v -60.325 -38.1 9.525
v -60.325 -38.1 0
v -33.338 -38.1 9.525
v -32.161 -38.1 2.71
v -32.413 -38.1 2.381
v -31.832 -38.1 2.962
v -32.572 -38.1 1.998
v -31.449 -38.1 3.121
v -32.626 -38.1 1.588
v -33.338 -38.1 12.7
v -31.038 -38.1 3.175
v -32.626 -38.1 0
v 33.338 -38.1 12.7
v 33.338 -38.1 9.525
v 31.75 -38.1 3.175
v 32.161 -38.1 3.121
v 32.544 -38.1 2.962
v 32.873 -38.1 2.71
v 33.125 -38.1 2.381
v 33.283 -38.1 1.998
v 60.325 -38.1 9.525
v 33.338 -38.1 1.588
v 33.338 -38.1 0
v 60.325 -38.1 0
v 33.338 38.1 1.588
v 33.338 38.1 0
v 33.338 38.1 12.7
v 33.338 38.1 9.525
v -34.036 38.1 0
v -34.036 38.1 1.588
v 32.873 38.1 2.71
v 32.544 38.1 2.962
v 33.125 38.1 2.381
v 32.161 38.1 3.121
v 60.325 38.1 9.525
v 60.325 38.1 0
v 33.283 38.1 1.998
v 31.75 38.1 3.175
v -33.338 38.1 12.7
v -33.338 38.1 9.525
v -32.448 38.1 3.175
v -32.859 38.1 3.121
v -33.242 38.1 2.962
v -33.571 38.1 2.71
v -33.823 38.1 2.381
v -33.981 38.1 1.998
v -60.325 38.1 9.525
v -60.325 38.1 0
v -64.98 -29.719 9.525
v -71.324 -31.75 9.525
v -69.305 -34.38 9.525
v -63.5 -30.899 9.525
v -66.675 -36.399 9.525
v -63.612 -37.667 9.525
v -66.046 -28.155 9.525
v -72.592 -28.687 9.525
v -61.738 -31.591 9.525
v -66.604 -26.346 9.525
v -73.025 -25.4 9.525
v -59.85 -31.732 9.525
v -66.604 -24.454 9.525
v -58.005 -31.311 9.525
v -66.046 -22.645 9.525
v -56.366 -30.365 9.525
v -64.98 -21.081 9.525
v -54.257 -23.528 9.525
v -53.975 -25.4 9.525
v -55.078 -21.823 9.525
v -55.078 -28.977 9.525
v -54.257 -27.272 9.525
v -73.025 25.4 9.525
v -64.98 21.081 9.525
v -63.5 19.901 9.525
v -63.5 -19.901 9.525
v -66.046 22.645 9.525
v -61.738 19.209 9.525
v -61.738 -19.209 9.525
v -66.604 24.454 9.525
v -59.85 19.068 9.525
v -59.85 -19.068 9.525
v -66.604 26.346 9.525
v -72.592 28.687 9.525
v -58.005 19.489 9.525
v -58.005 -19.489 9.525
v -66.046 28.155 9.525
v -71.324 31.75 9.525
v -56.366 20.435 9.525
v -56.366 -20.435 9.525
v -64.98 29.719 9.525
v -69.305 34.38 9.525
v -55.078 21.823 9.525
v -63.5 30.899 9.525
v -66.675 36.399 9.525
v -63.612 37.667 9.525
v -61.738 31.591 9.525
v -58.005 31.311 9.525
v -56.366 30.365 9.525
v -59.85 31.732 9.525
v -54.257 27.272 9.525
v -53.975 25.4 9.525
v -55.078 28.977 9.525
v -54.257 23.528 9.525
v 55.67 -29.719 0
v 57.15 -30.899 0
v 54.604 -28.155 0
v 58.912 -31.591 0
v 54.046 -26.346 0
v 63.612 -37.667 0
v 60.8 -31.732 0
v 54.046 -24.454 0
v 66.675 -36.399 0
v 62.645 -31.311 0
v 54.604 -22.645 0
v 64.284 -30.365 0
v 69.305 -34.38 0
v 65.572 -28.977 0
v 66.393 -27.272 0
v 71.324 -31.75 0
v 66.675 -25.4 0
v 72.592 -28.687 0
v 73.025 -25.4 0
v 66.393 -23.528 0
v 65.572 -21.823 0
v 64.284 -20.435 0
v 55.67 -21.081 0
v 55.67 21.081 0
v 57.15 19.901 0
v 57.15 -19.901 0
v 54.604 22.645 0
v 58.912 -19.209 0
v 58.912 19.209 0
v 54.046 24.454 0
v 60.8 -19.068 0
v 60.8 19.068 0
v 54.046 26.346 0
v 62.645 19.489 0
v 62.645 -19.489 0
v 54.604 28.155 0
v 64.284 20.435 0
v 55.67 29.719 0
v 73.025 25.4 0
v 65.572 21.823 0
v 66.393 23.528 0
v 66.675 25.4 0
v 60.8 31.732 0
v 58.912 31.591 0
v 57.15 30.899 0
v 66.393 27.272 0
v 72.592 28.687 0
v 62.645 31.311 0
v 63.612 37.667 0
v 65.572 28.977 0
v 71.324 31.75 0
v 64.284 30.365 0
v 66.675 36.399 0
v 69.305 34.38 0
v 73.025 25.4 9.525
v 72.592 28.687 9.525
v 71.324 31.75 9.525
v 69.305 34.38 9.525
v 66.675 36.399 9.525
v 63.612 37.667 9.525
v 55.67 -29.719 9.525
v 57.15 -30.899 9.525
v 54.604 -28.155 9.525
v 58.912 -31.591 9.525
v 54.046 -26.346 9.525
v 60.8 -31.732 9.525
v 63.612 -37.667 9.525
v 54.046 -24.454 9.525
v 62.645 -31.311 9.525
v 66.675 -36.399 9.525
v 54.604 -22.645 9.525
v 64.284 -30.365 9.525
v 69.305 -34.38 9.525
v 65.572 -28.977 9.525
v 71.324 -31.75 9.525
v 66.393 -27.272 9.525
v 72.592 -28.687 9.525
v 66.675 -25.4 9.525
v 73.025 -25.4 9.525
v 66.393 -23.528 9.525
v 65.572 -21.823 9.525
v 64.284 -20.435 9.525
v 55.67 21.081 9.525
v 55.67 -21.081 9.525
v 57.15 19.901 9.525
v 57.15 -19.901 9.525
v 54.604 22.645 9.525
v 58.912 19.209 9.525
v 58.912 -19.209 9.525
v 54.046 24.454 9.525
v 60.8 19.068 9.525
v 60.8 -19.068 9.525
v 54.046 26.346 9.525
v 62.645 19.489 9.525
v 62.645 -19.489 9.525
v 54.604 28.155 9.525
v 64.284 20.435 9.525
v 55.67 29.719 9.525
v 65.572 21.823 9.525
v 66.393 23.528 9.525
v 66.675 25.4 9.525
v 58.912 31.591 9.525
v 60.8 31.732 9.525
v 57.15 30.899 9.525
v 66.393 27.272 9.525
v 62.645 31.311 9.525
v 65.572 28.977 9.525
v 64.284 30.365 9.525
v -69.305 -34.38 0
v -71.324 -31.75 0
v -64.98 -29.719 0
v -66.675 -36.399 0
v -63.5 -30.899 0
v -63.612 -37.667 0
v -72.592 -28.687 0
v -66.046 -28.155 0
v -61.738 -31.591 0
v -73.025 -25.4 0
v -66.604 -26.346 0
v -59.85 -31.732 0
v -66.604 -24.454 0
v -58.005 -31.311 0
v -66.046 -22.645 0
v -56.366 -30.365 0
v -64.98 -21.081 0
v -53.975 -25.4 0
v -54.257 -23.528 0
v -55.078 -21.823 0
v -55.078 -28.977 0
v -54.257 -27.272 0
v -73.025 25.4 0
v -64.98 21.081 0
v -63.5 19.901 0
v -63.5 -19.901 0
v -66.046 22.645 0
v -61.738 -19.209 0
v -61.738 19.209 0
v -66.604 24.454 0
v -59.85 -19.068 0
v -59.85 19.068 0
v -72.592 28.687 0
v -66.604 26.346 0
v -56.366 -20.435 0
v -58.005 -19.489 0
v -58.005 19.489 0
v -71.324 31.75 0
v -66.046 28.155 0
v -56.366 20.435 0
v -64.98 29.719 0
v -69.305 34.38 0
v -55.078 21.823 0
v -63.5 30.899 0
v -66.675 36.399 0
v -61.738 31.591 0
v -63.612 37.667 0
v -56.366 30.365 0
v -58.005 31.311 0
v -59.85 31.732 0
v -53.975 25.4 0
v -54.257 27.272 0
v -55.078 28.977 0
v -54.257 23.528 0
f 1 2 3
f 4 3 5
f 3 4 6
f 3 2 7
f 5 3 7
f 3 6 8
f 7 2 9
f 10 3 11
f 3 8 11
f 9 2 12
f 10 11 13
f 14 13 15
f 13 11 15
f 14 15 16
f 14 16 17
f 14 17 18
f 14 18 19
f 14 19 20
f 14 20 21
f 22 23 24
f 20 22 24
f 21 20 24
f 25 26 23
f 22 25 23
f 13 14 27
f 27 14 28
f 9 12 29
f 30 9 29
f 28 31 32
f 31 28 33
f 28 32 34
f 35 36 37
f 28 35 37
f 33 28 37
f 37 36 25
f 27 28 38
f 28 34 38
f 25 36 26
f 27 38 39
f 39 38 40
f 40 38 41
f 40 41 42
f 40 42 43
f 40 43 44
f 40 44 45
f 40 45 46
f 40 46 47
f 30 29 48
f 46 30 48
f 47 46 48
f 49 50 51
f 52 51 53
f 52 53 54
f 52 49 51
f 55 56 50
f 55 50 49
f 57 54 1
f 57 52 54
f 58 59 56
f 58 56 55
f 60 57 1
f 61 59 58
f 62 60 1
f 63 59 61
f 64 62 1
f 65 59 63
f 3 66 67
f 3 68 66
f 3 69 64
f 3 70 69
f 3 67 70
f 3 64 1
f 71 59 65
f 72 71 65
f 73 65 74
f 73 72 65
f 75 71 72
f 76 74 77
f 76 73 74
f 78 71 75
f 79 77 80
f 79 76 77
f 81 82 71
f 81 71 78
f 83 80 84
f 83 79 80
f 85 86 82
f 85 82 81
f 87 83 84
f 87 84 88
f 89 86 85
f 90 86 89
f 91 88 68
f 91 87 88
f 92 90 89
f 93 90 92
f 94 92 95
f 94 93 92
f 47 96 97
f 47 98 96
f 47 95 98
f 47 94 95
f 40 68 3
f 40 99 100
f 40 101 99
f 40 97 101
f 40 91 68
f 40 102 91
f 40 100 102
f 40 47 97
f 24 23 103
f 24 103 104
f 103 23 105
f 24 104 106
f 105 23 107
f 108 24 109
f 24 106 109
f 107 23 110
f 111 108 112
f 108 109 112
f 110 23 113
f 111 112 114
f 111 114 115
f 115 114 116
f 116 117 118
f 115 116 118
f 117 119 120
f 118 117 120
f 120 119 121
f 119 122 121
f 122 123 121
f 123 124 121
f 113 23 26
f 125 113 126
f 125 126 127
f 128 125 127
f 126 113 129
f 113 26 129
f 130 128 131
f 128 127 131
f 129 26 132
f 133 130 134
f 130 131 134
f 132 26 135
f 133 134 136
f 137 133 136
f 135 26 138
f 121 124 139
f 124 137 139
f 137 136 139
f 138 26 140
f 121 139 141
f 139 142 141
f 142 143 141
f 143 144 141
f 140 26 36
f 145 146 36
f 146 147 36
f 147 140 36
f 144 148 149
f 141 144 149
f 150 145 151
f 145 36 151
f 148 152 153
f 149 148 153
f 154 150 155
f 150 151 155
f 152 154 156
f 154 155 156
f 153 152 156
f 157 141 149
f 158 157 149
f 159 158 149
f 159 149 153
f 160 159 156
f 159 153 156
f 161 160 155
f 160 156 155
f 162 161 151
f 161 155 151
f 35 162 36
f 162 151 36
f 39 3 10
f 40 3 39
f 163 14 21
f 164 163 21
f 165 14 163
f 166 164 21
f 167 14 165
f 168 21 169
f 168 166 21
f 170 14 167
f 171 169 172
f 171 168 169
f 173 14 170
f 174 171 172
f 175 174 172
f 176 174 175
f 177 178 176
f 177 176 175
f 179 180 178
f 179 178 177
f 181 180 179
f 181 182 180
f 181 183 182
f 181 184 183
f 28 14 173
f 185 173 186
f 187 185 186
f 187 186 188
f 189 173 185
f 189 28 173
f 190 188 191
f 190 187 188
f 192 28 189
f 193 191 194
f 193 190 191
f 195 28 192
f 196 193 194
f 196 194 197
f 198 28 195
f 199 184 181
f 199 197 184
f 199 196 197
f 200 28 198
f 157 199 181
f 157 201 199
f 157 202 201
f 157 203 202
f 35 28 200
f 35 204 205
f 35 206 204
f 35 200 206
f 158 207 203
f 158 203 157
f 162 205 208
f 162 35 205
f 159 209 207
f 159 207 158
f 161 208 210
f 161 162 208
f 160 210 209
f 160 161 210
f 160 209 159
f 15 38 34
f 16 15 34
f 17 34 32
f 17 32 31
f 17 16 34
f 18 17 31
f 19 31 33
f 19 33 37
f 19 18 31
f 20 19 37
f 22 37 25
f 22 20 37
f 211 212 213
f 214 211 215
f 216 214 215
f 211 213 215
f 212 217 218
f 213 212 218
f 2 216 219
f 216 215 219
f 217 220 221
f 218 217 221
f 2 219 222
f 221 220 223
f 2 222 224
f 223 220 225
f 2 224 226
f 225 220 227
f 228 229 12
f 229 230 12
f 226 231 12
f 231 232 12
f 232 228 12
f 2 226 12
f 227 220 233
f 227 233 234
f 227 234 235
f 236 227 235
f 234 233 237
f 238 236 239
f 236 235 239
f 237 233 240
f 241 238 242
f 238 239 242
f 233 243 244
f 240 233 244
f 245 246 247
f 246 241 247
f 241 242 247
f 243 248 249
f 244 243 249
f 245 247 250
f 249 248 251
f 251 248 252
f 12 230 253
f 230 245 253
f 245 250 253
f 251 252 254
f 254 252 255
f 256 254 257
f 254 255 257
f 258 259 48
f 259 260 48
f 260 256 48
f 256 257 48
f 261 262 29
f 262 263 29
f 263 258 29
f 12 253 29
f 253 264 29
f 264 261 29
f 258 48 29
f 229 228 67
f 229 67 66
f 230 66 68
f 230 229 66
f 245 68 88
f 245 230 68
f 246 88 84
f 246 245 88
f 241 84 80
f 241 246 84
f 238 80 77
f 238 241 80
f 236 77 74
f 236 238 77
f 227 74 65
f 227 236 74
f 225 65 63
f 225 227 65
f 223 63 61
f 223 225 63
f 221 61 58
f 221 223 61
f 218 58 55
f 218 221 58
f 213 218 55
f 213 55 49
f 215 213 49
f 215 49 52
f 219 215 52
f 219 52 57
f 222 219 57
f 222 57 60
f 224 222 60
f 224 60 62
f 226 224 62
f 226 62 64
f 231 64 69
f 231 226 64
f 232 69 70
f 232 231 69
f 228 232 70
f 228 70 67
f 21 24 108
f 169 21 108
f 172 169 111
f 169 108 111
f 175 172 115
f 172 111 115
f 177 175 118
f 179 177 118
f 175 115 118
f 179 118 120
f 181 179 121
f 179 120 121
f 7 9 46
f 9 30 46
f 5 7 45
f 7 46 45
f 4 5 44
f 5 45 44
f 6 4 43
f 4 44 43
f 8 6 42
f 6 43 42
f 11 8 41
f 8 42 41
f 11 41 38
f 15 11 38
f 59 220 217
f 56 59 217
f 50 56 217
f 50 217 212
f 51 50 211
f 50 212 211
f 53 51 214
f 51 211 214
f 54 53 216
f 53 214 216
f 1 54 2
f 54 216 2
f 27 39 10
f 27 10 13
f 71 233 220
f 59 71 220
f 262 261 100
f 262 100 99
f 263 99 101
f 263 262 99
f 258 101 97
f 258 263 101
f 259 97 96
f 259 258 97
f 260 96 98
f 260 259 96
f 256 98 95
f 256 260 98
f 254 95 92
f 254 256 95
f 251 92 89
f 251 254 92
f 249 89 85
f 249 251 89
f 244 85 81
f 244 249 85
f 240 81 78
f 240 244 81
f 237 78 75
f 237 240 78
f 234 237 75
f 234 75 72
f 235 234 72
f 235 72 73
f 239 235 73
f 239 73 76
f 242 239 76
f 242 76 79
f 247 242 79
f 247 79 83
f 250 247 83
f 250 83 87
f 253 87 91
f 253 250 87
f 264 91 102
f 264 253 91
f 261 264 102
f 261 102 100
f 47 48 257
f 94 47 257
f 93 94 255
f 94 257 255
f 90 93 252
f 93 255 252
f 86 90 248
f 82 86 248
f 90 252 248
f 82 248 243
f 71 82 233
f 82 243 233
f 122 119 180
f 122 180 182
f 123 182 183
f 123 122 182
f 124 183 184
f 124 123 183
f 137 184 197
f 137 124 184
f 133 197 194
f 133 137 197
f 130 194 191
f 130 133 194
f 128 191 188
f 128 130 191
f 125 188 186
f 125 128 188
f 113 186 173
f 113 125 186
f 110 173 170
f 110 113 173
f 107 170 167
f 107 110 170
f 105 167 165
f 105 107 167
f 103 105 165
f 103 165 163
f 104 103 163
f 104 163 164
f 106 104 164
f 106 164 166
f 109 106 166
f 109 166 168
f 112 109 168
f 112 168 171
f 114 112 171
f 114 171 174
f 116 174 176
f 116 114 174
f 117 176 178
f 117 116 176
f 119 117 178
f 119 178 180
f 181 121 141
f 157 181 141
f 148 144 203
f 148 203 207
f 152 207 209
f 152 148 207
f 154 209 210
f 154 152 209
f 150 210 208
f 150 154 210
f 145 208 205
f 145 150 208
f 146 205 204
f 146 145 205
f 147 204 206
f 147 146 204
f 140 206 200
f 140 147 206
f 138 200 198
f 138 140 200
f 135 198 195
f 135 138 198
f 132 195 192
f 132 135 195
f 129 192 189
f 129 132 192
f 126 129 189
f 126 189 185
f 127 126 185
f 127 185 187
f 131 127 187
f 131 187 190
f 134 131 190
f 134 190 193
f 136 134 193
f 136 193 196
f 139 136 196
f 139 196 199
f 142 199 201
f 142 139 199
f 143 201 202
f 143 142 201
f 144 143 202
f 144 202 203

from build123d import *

# Parameters (mm, degrees)
F0_W     = 66.675
F0_H     = 76.2
F0_R     = 6.35
F1_DEPTH = 9.525
F2_W     = 66.675
F2_H     = 76.2
F3_DEPTH = 3.175
F5_DEPTH = 3.175
F6_R     = 1.5875


with BuildPart() as f1:
    # F0 (on Top) → F1 (new body)
    with BuildSketch(Plane.XY):
        Rectangle(F0_W, F0_H)
        with BuildLine():
            Line((60.325, 38.1), (33.3375, 38.1))
            Line((33.3375, 38.1), (33.3375, -38.1))
            Line((33.3375, -38.1), (60.325, -38.1))
            ThreePointArc((60.325, -38.1), (69.305256, -34.380256), (73.025, -25.4))
            Line((73.025, -25.4), (73.025, 25.4))
            ThreePointArc((73.025, 25.4), (69.305256, 34.380256), (60.325, 38.1))
        make_face()
        with Locations((60.325, -25.4)):
            Circle(F0_R, mode=Mode.SUBTRACT)
        with Locations((60.325, 25.4)):
            Circle(F0_R, mode=Mode.SUBTRACT)
        with BuildLine():
            Line((-33.3375, 38.1), (-60.325, 38.1))
            ThreePointArc((-60.325, 38.1), (-69.305256, 34.380256), (-73.025, 25.4))
            Line((-73.025, 25.4), (-73.025, -25.4))
            ThreePointArc((-73.025, -25.4), (-69.305256, -34.380256), (-60.325, -38.1))
            Line((-60.325, -38.1), (-33.3375, -38.1))
            Line((-33.3375, -38.1), (-33.3375, 38.1))
        make_face()
        with Locations((-60.325, -25.4)):
            Circle(F0_R, mode=Mode.SUBTRACT)
        with Locations((-60.325, 25.4)):
            Circle(F0_R, mode=Mode.SUBTRACT)
    extrude(amount=F1_DEPTH)

    # F2 (on face) → F3 (join)
    with BuildSketch(Plane.XY.offset(9.525)):
        Rectangle(F2_W, F2_H)
    extrude(amount=F3_DEPTH)

    # F4 (on face) → F5 (cut)
    with BuildSketch(Plane(origin=(0, 0, 0), x_dir=(1, 0, 0), z_dir=(0, 0, -1))):
        Polygon((33.3375, -38.1), (33.3375, 38.1), (-32.625852, 38.1), (-34.035566, -38.1), align=None)
    extrude(amount=-F5_DEPTH, mode=Mode.SUBTRACT)

    # F6
    f6_edges = [f1.edges().sort_by_distance(p)[0] for p in [
        (33.3375, 0, 3.175),
        (-33.330709, 0, 3.175),
    ]]
    fillet(f6_edges, radius=F6_R)


solid = f1.part
